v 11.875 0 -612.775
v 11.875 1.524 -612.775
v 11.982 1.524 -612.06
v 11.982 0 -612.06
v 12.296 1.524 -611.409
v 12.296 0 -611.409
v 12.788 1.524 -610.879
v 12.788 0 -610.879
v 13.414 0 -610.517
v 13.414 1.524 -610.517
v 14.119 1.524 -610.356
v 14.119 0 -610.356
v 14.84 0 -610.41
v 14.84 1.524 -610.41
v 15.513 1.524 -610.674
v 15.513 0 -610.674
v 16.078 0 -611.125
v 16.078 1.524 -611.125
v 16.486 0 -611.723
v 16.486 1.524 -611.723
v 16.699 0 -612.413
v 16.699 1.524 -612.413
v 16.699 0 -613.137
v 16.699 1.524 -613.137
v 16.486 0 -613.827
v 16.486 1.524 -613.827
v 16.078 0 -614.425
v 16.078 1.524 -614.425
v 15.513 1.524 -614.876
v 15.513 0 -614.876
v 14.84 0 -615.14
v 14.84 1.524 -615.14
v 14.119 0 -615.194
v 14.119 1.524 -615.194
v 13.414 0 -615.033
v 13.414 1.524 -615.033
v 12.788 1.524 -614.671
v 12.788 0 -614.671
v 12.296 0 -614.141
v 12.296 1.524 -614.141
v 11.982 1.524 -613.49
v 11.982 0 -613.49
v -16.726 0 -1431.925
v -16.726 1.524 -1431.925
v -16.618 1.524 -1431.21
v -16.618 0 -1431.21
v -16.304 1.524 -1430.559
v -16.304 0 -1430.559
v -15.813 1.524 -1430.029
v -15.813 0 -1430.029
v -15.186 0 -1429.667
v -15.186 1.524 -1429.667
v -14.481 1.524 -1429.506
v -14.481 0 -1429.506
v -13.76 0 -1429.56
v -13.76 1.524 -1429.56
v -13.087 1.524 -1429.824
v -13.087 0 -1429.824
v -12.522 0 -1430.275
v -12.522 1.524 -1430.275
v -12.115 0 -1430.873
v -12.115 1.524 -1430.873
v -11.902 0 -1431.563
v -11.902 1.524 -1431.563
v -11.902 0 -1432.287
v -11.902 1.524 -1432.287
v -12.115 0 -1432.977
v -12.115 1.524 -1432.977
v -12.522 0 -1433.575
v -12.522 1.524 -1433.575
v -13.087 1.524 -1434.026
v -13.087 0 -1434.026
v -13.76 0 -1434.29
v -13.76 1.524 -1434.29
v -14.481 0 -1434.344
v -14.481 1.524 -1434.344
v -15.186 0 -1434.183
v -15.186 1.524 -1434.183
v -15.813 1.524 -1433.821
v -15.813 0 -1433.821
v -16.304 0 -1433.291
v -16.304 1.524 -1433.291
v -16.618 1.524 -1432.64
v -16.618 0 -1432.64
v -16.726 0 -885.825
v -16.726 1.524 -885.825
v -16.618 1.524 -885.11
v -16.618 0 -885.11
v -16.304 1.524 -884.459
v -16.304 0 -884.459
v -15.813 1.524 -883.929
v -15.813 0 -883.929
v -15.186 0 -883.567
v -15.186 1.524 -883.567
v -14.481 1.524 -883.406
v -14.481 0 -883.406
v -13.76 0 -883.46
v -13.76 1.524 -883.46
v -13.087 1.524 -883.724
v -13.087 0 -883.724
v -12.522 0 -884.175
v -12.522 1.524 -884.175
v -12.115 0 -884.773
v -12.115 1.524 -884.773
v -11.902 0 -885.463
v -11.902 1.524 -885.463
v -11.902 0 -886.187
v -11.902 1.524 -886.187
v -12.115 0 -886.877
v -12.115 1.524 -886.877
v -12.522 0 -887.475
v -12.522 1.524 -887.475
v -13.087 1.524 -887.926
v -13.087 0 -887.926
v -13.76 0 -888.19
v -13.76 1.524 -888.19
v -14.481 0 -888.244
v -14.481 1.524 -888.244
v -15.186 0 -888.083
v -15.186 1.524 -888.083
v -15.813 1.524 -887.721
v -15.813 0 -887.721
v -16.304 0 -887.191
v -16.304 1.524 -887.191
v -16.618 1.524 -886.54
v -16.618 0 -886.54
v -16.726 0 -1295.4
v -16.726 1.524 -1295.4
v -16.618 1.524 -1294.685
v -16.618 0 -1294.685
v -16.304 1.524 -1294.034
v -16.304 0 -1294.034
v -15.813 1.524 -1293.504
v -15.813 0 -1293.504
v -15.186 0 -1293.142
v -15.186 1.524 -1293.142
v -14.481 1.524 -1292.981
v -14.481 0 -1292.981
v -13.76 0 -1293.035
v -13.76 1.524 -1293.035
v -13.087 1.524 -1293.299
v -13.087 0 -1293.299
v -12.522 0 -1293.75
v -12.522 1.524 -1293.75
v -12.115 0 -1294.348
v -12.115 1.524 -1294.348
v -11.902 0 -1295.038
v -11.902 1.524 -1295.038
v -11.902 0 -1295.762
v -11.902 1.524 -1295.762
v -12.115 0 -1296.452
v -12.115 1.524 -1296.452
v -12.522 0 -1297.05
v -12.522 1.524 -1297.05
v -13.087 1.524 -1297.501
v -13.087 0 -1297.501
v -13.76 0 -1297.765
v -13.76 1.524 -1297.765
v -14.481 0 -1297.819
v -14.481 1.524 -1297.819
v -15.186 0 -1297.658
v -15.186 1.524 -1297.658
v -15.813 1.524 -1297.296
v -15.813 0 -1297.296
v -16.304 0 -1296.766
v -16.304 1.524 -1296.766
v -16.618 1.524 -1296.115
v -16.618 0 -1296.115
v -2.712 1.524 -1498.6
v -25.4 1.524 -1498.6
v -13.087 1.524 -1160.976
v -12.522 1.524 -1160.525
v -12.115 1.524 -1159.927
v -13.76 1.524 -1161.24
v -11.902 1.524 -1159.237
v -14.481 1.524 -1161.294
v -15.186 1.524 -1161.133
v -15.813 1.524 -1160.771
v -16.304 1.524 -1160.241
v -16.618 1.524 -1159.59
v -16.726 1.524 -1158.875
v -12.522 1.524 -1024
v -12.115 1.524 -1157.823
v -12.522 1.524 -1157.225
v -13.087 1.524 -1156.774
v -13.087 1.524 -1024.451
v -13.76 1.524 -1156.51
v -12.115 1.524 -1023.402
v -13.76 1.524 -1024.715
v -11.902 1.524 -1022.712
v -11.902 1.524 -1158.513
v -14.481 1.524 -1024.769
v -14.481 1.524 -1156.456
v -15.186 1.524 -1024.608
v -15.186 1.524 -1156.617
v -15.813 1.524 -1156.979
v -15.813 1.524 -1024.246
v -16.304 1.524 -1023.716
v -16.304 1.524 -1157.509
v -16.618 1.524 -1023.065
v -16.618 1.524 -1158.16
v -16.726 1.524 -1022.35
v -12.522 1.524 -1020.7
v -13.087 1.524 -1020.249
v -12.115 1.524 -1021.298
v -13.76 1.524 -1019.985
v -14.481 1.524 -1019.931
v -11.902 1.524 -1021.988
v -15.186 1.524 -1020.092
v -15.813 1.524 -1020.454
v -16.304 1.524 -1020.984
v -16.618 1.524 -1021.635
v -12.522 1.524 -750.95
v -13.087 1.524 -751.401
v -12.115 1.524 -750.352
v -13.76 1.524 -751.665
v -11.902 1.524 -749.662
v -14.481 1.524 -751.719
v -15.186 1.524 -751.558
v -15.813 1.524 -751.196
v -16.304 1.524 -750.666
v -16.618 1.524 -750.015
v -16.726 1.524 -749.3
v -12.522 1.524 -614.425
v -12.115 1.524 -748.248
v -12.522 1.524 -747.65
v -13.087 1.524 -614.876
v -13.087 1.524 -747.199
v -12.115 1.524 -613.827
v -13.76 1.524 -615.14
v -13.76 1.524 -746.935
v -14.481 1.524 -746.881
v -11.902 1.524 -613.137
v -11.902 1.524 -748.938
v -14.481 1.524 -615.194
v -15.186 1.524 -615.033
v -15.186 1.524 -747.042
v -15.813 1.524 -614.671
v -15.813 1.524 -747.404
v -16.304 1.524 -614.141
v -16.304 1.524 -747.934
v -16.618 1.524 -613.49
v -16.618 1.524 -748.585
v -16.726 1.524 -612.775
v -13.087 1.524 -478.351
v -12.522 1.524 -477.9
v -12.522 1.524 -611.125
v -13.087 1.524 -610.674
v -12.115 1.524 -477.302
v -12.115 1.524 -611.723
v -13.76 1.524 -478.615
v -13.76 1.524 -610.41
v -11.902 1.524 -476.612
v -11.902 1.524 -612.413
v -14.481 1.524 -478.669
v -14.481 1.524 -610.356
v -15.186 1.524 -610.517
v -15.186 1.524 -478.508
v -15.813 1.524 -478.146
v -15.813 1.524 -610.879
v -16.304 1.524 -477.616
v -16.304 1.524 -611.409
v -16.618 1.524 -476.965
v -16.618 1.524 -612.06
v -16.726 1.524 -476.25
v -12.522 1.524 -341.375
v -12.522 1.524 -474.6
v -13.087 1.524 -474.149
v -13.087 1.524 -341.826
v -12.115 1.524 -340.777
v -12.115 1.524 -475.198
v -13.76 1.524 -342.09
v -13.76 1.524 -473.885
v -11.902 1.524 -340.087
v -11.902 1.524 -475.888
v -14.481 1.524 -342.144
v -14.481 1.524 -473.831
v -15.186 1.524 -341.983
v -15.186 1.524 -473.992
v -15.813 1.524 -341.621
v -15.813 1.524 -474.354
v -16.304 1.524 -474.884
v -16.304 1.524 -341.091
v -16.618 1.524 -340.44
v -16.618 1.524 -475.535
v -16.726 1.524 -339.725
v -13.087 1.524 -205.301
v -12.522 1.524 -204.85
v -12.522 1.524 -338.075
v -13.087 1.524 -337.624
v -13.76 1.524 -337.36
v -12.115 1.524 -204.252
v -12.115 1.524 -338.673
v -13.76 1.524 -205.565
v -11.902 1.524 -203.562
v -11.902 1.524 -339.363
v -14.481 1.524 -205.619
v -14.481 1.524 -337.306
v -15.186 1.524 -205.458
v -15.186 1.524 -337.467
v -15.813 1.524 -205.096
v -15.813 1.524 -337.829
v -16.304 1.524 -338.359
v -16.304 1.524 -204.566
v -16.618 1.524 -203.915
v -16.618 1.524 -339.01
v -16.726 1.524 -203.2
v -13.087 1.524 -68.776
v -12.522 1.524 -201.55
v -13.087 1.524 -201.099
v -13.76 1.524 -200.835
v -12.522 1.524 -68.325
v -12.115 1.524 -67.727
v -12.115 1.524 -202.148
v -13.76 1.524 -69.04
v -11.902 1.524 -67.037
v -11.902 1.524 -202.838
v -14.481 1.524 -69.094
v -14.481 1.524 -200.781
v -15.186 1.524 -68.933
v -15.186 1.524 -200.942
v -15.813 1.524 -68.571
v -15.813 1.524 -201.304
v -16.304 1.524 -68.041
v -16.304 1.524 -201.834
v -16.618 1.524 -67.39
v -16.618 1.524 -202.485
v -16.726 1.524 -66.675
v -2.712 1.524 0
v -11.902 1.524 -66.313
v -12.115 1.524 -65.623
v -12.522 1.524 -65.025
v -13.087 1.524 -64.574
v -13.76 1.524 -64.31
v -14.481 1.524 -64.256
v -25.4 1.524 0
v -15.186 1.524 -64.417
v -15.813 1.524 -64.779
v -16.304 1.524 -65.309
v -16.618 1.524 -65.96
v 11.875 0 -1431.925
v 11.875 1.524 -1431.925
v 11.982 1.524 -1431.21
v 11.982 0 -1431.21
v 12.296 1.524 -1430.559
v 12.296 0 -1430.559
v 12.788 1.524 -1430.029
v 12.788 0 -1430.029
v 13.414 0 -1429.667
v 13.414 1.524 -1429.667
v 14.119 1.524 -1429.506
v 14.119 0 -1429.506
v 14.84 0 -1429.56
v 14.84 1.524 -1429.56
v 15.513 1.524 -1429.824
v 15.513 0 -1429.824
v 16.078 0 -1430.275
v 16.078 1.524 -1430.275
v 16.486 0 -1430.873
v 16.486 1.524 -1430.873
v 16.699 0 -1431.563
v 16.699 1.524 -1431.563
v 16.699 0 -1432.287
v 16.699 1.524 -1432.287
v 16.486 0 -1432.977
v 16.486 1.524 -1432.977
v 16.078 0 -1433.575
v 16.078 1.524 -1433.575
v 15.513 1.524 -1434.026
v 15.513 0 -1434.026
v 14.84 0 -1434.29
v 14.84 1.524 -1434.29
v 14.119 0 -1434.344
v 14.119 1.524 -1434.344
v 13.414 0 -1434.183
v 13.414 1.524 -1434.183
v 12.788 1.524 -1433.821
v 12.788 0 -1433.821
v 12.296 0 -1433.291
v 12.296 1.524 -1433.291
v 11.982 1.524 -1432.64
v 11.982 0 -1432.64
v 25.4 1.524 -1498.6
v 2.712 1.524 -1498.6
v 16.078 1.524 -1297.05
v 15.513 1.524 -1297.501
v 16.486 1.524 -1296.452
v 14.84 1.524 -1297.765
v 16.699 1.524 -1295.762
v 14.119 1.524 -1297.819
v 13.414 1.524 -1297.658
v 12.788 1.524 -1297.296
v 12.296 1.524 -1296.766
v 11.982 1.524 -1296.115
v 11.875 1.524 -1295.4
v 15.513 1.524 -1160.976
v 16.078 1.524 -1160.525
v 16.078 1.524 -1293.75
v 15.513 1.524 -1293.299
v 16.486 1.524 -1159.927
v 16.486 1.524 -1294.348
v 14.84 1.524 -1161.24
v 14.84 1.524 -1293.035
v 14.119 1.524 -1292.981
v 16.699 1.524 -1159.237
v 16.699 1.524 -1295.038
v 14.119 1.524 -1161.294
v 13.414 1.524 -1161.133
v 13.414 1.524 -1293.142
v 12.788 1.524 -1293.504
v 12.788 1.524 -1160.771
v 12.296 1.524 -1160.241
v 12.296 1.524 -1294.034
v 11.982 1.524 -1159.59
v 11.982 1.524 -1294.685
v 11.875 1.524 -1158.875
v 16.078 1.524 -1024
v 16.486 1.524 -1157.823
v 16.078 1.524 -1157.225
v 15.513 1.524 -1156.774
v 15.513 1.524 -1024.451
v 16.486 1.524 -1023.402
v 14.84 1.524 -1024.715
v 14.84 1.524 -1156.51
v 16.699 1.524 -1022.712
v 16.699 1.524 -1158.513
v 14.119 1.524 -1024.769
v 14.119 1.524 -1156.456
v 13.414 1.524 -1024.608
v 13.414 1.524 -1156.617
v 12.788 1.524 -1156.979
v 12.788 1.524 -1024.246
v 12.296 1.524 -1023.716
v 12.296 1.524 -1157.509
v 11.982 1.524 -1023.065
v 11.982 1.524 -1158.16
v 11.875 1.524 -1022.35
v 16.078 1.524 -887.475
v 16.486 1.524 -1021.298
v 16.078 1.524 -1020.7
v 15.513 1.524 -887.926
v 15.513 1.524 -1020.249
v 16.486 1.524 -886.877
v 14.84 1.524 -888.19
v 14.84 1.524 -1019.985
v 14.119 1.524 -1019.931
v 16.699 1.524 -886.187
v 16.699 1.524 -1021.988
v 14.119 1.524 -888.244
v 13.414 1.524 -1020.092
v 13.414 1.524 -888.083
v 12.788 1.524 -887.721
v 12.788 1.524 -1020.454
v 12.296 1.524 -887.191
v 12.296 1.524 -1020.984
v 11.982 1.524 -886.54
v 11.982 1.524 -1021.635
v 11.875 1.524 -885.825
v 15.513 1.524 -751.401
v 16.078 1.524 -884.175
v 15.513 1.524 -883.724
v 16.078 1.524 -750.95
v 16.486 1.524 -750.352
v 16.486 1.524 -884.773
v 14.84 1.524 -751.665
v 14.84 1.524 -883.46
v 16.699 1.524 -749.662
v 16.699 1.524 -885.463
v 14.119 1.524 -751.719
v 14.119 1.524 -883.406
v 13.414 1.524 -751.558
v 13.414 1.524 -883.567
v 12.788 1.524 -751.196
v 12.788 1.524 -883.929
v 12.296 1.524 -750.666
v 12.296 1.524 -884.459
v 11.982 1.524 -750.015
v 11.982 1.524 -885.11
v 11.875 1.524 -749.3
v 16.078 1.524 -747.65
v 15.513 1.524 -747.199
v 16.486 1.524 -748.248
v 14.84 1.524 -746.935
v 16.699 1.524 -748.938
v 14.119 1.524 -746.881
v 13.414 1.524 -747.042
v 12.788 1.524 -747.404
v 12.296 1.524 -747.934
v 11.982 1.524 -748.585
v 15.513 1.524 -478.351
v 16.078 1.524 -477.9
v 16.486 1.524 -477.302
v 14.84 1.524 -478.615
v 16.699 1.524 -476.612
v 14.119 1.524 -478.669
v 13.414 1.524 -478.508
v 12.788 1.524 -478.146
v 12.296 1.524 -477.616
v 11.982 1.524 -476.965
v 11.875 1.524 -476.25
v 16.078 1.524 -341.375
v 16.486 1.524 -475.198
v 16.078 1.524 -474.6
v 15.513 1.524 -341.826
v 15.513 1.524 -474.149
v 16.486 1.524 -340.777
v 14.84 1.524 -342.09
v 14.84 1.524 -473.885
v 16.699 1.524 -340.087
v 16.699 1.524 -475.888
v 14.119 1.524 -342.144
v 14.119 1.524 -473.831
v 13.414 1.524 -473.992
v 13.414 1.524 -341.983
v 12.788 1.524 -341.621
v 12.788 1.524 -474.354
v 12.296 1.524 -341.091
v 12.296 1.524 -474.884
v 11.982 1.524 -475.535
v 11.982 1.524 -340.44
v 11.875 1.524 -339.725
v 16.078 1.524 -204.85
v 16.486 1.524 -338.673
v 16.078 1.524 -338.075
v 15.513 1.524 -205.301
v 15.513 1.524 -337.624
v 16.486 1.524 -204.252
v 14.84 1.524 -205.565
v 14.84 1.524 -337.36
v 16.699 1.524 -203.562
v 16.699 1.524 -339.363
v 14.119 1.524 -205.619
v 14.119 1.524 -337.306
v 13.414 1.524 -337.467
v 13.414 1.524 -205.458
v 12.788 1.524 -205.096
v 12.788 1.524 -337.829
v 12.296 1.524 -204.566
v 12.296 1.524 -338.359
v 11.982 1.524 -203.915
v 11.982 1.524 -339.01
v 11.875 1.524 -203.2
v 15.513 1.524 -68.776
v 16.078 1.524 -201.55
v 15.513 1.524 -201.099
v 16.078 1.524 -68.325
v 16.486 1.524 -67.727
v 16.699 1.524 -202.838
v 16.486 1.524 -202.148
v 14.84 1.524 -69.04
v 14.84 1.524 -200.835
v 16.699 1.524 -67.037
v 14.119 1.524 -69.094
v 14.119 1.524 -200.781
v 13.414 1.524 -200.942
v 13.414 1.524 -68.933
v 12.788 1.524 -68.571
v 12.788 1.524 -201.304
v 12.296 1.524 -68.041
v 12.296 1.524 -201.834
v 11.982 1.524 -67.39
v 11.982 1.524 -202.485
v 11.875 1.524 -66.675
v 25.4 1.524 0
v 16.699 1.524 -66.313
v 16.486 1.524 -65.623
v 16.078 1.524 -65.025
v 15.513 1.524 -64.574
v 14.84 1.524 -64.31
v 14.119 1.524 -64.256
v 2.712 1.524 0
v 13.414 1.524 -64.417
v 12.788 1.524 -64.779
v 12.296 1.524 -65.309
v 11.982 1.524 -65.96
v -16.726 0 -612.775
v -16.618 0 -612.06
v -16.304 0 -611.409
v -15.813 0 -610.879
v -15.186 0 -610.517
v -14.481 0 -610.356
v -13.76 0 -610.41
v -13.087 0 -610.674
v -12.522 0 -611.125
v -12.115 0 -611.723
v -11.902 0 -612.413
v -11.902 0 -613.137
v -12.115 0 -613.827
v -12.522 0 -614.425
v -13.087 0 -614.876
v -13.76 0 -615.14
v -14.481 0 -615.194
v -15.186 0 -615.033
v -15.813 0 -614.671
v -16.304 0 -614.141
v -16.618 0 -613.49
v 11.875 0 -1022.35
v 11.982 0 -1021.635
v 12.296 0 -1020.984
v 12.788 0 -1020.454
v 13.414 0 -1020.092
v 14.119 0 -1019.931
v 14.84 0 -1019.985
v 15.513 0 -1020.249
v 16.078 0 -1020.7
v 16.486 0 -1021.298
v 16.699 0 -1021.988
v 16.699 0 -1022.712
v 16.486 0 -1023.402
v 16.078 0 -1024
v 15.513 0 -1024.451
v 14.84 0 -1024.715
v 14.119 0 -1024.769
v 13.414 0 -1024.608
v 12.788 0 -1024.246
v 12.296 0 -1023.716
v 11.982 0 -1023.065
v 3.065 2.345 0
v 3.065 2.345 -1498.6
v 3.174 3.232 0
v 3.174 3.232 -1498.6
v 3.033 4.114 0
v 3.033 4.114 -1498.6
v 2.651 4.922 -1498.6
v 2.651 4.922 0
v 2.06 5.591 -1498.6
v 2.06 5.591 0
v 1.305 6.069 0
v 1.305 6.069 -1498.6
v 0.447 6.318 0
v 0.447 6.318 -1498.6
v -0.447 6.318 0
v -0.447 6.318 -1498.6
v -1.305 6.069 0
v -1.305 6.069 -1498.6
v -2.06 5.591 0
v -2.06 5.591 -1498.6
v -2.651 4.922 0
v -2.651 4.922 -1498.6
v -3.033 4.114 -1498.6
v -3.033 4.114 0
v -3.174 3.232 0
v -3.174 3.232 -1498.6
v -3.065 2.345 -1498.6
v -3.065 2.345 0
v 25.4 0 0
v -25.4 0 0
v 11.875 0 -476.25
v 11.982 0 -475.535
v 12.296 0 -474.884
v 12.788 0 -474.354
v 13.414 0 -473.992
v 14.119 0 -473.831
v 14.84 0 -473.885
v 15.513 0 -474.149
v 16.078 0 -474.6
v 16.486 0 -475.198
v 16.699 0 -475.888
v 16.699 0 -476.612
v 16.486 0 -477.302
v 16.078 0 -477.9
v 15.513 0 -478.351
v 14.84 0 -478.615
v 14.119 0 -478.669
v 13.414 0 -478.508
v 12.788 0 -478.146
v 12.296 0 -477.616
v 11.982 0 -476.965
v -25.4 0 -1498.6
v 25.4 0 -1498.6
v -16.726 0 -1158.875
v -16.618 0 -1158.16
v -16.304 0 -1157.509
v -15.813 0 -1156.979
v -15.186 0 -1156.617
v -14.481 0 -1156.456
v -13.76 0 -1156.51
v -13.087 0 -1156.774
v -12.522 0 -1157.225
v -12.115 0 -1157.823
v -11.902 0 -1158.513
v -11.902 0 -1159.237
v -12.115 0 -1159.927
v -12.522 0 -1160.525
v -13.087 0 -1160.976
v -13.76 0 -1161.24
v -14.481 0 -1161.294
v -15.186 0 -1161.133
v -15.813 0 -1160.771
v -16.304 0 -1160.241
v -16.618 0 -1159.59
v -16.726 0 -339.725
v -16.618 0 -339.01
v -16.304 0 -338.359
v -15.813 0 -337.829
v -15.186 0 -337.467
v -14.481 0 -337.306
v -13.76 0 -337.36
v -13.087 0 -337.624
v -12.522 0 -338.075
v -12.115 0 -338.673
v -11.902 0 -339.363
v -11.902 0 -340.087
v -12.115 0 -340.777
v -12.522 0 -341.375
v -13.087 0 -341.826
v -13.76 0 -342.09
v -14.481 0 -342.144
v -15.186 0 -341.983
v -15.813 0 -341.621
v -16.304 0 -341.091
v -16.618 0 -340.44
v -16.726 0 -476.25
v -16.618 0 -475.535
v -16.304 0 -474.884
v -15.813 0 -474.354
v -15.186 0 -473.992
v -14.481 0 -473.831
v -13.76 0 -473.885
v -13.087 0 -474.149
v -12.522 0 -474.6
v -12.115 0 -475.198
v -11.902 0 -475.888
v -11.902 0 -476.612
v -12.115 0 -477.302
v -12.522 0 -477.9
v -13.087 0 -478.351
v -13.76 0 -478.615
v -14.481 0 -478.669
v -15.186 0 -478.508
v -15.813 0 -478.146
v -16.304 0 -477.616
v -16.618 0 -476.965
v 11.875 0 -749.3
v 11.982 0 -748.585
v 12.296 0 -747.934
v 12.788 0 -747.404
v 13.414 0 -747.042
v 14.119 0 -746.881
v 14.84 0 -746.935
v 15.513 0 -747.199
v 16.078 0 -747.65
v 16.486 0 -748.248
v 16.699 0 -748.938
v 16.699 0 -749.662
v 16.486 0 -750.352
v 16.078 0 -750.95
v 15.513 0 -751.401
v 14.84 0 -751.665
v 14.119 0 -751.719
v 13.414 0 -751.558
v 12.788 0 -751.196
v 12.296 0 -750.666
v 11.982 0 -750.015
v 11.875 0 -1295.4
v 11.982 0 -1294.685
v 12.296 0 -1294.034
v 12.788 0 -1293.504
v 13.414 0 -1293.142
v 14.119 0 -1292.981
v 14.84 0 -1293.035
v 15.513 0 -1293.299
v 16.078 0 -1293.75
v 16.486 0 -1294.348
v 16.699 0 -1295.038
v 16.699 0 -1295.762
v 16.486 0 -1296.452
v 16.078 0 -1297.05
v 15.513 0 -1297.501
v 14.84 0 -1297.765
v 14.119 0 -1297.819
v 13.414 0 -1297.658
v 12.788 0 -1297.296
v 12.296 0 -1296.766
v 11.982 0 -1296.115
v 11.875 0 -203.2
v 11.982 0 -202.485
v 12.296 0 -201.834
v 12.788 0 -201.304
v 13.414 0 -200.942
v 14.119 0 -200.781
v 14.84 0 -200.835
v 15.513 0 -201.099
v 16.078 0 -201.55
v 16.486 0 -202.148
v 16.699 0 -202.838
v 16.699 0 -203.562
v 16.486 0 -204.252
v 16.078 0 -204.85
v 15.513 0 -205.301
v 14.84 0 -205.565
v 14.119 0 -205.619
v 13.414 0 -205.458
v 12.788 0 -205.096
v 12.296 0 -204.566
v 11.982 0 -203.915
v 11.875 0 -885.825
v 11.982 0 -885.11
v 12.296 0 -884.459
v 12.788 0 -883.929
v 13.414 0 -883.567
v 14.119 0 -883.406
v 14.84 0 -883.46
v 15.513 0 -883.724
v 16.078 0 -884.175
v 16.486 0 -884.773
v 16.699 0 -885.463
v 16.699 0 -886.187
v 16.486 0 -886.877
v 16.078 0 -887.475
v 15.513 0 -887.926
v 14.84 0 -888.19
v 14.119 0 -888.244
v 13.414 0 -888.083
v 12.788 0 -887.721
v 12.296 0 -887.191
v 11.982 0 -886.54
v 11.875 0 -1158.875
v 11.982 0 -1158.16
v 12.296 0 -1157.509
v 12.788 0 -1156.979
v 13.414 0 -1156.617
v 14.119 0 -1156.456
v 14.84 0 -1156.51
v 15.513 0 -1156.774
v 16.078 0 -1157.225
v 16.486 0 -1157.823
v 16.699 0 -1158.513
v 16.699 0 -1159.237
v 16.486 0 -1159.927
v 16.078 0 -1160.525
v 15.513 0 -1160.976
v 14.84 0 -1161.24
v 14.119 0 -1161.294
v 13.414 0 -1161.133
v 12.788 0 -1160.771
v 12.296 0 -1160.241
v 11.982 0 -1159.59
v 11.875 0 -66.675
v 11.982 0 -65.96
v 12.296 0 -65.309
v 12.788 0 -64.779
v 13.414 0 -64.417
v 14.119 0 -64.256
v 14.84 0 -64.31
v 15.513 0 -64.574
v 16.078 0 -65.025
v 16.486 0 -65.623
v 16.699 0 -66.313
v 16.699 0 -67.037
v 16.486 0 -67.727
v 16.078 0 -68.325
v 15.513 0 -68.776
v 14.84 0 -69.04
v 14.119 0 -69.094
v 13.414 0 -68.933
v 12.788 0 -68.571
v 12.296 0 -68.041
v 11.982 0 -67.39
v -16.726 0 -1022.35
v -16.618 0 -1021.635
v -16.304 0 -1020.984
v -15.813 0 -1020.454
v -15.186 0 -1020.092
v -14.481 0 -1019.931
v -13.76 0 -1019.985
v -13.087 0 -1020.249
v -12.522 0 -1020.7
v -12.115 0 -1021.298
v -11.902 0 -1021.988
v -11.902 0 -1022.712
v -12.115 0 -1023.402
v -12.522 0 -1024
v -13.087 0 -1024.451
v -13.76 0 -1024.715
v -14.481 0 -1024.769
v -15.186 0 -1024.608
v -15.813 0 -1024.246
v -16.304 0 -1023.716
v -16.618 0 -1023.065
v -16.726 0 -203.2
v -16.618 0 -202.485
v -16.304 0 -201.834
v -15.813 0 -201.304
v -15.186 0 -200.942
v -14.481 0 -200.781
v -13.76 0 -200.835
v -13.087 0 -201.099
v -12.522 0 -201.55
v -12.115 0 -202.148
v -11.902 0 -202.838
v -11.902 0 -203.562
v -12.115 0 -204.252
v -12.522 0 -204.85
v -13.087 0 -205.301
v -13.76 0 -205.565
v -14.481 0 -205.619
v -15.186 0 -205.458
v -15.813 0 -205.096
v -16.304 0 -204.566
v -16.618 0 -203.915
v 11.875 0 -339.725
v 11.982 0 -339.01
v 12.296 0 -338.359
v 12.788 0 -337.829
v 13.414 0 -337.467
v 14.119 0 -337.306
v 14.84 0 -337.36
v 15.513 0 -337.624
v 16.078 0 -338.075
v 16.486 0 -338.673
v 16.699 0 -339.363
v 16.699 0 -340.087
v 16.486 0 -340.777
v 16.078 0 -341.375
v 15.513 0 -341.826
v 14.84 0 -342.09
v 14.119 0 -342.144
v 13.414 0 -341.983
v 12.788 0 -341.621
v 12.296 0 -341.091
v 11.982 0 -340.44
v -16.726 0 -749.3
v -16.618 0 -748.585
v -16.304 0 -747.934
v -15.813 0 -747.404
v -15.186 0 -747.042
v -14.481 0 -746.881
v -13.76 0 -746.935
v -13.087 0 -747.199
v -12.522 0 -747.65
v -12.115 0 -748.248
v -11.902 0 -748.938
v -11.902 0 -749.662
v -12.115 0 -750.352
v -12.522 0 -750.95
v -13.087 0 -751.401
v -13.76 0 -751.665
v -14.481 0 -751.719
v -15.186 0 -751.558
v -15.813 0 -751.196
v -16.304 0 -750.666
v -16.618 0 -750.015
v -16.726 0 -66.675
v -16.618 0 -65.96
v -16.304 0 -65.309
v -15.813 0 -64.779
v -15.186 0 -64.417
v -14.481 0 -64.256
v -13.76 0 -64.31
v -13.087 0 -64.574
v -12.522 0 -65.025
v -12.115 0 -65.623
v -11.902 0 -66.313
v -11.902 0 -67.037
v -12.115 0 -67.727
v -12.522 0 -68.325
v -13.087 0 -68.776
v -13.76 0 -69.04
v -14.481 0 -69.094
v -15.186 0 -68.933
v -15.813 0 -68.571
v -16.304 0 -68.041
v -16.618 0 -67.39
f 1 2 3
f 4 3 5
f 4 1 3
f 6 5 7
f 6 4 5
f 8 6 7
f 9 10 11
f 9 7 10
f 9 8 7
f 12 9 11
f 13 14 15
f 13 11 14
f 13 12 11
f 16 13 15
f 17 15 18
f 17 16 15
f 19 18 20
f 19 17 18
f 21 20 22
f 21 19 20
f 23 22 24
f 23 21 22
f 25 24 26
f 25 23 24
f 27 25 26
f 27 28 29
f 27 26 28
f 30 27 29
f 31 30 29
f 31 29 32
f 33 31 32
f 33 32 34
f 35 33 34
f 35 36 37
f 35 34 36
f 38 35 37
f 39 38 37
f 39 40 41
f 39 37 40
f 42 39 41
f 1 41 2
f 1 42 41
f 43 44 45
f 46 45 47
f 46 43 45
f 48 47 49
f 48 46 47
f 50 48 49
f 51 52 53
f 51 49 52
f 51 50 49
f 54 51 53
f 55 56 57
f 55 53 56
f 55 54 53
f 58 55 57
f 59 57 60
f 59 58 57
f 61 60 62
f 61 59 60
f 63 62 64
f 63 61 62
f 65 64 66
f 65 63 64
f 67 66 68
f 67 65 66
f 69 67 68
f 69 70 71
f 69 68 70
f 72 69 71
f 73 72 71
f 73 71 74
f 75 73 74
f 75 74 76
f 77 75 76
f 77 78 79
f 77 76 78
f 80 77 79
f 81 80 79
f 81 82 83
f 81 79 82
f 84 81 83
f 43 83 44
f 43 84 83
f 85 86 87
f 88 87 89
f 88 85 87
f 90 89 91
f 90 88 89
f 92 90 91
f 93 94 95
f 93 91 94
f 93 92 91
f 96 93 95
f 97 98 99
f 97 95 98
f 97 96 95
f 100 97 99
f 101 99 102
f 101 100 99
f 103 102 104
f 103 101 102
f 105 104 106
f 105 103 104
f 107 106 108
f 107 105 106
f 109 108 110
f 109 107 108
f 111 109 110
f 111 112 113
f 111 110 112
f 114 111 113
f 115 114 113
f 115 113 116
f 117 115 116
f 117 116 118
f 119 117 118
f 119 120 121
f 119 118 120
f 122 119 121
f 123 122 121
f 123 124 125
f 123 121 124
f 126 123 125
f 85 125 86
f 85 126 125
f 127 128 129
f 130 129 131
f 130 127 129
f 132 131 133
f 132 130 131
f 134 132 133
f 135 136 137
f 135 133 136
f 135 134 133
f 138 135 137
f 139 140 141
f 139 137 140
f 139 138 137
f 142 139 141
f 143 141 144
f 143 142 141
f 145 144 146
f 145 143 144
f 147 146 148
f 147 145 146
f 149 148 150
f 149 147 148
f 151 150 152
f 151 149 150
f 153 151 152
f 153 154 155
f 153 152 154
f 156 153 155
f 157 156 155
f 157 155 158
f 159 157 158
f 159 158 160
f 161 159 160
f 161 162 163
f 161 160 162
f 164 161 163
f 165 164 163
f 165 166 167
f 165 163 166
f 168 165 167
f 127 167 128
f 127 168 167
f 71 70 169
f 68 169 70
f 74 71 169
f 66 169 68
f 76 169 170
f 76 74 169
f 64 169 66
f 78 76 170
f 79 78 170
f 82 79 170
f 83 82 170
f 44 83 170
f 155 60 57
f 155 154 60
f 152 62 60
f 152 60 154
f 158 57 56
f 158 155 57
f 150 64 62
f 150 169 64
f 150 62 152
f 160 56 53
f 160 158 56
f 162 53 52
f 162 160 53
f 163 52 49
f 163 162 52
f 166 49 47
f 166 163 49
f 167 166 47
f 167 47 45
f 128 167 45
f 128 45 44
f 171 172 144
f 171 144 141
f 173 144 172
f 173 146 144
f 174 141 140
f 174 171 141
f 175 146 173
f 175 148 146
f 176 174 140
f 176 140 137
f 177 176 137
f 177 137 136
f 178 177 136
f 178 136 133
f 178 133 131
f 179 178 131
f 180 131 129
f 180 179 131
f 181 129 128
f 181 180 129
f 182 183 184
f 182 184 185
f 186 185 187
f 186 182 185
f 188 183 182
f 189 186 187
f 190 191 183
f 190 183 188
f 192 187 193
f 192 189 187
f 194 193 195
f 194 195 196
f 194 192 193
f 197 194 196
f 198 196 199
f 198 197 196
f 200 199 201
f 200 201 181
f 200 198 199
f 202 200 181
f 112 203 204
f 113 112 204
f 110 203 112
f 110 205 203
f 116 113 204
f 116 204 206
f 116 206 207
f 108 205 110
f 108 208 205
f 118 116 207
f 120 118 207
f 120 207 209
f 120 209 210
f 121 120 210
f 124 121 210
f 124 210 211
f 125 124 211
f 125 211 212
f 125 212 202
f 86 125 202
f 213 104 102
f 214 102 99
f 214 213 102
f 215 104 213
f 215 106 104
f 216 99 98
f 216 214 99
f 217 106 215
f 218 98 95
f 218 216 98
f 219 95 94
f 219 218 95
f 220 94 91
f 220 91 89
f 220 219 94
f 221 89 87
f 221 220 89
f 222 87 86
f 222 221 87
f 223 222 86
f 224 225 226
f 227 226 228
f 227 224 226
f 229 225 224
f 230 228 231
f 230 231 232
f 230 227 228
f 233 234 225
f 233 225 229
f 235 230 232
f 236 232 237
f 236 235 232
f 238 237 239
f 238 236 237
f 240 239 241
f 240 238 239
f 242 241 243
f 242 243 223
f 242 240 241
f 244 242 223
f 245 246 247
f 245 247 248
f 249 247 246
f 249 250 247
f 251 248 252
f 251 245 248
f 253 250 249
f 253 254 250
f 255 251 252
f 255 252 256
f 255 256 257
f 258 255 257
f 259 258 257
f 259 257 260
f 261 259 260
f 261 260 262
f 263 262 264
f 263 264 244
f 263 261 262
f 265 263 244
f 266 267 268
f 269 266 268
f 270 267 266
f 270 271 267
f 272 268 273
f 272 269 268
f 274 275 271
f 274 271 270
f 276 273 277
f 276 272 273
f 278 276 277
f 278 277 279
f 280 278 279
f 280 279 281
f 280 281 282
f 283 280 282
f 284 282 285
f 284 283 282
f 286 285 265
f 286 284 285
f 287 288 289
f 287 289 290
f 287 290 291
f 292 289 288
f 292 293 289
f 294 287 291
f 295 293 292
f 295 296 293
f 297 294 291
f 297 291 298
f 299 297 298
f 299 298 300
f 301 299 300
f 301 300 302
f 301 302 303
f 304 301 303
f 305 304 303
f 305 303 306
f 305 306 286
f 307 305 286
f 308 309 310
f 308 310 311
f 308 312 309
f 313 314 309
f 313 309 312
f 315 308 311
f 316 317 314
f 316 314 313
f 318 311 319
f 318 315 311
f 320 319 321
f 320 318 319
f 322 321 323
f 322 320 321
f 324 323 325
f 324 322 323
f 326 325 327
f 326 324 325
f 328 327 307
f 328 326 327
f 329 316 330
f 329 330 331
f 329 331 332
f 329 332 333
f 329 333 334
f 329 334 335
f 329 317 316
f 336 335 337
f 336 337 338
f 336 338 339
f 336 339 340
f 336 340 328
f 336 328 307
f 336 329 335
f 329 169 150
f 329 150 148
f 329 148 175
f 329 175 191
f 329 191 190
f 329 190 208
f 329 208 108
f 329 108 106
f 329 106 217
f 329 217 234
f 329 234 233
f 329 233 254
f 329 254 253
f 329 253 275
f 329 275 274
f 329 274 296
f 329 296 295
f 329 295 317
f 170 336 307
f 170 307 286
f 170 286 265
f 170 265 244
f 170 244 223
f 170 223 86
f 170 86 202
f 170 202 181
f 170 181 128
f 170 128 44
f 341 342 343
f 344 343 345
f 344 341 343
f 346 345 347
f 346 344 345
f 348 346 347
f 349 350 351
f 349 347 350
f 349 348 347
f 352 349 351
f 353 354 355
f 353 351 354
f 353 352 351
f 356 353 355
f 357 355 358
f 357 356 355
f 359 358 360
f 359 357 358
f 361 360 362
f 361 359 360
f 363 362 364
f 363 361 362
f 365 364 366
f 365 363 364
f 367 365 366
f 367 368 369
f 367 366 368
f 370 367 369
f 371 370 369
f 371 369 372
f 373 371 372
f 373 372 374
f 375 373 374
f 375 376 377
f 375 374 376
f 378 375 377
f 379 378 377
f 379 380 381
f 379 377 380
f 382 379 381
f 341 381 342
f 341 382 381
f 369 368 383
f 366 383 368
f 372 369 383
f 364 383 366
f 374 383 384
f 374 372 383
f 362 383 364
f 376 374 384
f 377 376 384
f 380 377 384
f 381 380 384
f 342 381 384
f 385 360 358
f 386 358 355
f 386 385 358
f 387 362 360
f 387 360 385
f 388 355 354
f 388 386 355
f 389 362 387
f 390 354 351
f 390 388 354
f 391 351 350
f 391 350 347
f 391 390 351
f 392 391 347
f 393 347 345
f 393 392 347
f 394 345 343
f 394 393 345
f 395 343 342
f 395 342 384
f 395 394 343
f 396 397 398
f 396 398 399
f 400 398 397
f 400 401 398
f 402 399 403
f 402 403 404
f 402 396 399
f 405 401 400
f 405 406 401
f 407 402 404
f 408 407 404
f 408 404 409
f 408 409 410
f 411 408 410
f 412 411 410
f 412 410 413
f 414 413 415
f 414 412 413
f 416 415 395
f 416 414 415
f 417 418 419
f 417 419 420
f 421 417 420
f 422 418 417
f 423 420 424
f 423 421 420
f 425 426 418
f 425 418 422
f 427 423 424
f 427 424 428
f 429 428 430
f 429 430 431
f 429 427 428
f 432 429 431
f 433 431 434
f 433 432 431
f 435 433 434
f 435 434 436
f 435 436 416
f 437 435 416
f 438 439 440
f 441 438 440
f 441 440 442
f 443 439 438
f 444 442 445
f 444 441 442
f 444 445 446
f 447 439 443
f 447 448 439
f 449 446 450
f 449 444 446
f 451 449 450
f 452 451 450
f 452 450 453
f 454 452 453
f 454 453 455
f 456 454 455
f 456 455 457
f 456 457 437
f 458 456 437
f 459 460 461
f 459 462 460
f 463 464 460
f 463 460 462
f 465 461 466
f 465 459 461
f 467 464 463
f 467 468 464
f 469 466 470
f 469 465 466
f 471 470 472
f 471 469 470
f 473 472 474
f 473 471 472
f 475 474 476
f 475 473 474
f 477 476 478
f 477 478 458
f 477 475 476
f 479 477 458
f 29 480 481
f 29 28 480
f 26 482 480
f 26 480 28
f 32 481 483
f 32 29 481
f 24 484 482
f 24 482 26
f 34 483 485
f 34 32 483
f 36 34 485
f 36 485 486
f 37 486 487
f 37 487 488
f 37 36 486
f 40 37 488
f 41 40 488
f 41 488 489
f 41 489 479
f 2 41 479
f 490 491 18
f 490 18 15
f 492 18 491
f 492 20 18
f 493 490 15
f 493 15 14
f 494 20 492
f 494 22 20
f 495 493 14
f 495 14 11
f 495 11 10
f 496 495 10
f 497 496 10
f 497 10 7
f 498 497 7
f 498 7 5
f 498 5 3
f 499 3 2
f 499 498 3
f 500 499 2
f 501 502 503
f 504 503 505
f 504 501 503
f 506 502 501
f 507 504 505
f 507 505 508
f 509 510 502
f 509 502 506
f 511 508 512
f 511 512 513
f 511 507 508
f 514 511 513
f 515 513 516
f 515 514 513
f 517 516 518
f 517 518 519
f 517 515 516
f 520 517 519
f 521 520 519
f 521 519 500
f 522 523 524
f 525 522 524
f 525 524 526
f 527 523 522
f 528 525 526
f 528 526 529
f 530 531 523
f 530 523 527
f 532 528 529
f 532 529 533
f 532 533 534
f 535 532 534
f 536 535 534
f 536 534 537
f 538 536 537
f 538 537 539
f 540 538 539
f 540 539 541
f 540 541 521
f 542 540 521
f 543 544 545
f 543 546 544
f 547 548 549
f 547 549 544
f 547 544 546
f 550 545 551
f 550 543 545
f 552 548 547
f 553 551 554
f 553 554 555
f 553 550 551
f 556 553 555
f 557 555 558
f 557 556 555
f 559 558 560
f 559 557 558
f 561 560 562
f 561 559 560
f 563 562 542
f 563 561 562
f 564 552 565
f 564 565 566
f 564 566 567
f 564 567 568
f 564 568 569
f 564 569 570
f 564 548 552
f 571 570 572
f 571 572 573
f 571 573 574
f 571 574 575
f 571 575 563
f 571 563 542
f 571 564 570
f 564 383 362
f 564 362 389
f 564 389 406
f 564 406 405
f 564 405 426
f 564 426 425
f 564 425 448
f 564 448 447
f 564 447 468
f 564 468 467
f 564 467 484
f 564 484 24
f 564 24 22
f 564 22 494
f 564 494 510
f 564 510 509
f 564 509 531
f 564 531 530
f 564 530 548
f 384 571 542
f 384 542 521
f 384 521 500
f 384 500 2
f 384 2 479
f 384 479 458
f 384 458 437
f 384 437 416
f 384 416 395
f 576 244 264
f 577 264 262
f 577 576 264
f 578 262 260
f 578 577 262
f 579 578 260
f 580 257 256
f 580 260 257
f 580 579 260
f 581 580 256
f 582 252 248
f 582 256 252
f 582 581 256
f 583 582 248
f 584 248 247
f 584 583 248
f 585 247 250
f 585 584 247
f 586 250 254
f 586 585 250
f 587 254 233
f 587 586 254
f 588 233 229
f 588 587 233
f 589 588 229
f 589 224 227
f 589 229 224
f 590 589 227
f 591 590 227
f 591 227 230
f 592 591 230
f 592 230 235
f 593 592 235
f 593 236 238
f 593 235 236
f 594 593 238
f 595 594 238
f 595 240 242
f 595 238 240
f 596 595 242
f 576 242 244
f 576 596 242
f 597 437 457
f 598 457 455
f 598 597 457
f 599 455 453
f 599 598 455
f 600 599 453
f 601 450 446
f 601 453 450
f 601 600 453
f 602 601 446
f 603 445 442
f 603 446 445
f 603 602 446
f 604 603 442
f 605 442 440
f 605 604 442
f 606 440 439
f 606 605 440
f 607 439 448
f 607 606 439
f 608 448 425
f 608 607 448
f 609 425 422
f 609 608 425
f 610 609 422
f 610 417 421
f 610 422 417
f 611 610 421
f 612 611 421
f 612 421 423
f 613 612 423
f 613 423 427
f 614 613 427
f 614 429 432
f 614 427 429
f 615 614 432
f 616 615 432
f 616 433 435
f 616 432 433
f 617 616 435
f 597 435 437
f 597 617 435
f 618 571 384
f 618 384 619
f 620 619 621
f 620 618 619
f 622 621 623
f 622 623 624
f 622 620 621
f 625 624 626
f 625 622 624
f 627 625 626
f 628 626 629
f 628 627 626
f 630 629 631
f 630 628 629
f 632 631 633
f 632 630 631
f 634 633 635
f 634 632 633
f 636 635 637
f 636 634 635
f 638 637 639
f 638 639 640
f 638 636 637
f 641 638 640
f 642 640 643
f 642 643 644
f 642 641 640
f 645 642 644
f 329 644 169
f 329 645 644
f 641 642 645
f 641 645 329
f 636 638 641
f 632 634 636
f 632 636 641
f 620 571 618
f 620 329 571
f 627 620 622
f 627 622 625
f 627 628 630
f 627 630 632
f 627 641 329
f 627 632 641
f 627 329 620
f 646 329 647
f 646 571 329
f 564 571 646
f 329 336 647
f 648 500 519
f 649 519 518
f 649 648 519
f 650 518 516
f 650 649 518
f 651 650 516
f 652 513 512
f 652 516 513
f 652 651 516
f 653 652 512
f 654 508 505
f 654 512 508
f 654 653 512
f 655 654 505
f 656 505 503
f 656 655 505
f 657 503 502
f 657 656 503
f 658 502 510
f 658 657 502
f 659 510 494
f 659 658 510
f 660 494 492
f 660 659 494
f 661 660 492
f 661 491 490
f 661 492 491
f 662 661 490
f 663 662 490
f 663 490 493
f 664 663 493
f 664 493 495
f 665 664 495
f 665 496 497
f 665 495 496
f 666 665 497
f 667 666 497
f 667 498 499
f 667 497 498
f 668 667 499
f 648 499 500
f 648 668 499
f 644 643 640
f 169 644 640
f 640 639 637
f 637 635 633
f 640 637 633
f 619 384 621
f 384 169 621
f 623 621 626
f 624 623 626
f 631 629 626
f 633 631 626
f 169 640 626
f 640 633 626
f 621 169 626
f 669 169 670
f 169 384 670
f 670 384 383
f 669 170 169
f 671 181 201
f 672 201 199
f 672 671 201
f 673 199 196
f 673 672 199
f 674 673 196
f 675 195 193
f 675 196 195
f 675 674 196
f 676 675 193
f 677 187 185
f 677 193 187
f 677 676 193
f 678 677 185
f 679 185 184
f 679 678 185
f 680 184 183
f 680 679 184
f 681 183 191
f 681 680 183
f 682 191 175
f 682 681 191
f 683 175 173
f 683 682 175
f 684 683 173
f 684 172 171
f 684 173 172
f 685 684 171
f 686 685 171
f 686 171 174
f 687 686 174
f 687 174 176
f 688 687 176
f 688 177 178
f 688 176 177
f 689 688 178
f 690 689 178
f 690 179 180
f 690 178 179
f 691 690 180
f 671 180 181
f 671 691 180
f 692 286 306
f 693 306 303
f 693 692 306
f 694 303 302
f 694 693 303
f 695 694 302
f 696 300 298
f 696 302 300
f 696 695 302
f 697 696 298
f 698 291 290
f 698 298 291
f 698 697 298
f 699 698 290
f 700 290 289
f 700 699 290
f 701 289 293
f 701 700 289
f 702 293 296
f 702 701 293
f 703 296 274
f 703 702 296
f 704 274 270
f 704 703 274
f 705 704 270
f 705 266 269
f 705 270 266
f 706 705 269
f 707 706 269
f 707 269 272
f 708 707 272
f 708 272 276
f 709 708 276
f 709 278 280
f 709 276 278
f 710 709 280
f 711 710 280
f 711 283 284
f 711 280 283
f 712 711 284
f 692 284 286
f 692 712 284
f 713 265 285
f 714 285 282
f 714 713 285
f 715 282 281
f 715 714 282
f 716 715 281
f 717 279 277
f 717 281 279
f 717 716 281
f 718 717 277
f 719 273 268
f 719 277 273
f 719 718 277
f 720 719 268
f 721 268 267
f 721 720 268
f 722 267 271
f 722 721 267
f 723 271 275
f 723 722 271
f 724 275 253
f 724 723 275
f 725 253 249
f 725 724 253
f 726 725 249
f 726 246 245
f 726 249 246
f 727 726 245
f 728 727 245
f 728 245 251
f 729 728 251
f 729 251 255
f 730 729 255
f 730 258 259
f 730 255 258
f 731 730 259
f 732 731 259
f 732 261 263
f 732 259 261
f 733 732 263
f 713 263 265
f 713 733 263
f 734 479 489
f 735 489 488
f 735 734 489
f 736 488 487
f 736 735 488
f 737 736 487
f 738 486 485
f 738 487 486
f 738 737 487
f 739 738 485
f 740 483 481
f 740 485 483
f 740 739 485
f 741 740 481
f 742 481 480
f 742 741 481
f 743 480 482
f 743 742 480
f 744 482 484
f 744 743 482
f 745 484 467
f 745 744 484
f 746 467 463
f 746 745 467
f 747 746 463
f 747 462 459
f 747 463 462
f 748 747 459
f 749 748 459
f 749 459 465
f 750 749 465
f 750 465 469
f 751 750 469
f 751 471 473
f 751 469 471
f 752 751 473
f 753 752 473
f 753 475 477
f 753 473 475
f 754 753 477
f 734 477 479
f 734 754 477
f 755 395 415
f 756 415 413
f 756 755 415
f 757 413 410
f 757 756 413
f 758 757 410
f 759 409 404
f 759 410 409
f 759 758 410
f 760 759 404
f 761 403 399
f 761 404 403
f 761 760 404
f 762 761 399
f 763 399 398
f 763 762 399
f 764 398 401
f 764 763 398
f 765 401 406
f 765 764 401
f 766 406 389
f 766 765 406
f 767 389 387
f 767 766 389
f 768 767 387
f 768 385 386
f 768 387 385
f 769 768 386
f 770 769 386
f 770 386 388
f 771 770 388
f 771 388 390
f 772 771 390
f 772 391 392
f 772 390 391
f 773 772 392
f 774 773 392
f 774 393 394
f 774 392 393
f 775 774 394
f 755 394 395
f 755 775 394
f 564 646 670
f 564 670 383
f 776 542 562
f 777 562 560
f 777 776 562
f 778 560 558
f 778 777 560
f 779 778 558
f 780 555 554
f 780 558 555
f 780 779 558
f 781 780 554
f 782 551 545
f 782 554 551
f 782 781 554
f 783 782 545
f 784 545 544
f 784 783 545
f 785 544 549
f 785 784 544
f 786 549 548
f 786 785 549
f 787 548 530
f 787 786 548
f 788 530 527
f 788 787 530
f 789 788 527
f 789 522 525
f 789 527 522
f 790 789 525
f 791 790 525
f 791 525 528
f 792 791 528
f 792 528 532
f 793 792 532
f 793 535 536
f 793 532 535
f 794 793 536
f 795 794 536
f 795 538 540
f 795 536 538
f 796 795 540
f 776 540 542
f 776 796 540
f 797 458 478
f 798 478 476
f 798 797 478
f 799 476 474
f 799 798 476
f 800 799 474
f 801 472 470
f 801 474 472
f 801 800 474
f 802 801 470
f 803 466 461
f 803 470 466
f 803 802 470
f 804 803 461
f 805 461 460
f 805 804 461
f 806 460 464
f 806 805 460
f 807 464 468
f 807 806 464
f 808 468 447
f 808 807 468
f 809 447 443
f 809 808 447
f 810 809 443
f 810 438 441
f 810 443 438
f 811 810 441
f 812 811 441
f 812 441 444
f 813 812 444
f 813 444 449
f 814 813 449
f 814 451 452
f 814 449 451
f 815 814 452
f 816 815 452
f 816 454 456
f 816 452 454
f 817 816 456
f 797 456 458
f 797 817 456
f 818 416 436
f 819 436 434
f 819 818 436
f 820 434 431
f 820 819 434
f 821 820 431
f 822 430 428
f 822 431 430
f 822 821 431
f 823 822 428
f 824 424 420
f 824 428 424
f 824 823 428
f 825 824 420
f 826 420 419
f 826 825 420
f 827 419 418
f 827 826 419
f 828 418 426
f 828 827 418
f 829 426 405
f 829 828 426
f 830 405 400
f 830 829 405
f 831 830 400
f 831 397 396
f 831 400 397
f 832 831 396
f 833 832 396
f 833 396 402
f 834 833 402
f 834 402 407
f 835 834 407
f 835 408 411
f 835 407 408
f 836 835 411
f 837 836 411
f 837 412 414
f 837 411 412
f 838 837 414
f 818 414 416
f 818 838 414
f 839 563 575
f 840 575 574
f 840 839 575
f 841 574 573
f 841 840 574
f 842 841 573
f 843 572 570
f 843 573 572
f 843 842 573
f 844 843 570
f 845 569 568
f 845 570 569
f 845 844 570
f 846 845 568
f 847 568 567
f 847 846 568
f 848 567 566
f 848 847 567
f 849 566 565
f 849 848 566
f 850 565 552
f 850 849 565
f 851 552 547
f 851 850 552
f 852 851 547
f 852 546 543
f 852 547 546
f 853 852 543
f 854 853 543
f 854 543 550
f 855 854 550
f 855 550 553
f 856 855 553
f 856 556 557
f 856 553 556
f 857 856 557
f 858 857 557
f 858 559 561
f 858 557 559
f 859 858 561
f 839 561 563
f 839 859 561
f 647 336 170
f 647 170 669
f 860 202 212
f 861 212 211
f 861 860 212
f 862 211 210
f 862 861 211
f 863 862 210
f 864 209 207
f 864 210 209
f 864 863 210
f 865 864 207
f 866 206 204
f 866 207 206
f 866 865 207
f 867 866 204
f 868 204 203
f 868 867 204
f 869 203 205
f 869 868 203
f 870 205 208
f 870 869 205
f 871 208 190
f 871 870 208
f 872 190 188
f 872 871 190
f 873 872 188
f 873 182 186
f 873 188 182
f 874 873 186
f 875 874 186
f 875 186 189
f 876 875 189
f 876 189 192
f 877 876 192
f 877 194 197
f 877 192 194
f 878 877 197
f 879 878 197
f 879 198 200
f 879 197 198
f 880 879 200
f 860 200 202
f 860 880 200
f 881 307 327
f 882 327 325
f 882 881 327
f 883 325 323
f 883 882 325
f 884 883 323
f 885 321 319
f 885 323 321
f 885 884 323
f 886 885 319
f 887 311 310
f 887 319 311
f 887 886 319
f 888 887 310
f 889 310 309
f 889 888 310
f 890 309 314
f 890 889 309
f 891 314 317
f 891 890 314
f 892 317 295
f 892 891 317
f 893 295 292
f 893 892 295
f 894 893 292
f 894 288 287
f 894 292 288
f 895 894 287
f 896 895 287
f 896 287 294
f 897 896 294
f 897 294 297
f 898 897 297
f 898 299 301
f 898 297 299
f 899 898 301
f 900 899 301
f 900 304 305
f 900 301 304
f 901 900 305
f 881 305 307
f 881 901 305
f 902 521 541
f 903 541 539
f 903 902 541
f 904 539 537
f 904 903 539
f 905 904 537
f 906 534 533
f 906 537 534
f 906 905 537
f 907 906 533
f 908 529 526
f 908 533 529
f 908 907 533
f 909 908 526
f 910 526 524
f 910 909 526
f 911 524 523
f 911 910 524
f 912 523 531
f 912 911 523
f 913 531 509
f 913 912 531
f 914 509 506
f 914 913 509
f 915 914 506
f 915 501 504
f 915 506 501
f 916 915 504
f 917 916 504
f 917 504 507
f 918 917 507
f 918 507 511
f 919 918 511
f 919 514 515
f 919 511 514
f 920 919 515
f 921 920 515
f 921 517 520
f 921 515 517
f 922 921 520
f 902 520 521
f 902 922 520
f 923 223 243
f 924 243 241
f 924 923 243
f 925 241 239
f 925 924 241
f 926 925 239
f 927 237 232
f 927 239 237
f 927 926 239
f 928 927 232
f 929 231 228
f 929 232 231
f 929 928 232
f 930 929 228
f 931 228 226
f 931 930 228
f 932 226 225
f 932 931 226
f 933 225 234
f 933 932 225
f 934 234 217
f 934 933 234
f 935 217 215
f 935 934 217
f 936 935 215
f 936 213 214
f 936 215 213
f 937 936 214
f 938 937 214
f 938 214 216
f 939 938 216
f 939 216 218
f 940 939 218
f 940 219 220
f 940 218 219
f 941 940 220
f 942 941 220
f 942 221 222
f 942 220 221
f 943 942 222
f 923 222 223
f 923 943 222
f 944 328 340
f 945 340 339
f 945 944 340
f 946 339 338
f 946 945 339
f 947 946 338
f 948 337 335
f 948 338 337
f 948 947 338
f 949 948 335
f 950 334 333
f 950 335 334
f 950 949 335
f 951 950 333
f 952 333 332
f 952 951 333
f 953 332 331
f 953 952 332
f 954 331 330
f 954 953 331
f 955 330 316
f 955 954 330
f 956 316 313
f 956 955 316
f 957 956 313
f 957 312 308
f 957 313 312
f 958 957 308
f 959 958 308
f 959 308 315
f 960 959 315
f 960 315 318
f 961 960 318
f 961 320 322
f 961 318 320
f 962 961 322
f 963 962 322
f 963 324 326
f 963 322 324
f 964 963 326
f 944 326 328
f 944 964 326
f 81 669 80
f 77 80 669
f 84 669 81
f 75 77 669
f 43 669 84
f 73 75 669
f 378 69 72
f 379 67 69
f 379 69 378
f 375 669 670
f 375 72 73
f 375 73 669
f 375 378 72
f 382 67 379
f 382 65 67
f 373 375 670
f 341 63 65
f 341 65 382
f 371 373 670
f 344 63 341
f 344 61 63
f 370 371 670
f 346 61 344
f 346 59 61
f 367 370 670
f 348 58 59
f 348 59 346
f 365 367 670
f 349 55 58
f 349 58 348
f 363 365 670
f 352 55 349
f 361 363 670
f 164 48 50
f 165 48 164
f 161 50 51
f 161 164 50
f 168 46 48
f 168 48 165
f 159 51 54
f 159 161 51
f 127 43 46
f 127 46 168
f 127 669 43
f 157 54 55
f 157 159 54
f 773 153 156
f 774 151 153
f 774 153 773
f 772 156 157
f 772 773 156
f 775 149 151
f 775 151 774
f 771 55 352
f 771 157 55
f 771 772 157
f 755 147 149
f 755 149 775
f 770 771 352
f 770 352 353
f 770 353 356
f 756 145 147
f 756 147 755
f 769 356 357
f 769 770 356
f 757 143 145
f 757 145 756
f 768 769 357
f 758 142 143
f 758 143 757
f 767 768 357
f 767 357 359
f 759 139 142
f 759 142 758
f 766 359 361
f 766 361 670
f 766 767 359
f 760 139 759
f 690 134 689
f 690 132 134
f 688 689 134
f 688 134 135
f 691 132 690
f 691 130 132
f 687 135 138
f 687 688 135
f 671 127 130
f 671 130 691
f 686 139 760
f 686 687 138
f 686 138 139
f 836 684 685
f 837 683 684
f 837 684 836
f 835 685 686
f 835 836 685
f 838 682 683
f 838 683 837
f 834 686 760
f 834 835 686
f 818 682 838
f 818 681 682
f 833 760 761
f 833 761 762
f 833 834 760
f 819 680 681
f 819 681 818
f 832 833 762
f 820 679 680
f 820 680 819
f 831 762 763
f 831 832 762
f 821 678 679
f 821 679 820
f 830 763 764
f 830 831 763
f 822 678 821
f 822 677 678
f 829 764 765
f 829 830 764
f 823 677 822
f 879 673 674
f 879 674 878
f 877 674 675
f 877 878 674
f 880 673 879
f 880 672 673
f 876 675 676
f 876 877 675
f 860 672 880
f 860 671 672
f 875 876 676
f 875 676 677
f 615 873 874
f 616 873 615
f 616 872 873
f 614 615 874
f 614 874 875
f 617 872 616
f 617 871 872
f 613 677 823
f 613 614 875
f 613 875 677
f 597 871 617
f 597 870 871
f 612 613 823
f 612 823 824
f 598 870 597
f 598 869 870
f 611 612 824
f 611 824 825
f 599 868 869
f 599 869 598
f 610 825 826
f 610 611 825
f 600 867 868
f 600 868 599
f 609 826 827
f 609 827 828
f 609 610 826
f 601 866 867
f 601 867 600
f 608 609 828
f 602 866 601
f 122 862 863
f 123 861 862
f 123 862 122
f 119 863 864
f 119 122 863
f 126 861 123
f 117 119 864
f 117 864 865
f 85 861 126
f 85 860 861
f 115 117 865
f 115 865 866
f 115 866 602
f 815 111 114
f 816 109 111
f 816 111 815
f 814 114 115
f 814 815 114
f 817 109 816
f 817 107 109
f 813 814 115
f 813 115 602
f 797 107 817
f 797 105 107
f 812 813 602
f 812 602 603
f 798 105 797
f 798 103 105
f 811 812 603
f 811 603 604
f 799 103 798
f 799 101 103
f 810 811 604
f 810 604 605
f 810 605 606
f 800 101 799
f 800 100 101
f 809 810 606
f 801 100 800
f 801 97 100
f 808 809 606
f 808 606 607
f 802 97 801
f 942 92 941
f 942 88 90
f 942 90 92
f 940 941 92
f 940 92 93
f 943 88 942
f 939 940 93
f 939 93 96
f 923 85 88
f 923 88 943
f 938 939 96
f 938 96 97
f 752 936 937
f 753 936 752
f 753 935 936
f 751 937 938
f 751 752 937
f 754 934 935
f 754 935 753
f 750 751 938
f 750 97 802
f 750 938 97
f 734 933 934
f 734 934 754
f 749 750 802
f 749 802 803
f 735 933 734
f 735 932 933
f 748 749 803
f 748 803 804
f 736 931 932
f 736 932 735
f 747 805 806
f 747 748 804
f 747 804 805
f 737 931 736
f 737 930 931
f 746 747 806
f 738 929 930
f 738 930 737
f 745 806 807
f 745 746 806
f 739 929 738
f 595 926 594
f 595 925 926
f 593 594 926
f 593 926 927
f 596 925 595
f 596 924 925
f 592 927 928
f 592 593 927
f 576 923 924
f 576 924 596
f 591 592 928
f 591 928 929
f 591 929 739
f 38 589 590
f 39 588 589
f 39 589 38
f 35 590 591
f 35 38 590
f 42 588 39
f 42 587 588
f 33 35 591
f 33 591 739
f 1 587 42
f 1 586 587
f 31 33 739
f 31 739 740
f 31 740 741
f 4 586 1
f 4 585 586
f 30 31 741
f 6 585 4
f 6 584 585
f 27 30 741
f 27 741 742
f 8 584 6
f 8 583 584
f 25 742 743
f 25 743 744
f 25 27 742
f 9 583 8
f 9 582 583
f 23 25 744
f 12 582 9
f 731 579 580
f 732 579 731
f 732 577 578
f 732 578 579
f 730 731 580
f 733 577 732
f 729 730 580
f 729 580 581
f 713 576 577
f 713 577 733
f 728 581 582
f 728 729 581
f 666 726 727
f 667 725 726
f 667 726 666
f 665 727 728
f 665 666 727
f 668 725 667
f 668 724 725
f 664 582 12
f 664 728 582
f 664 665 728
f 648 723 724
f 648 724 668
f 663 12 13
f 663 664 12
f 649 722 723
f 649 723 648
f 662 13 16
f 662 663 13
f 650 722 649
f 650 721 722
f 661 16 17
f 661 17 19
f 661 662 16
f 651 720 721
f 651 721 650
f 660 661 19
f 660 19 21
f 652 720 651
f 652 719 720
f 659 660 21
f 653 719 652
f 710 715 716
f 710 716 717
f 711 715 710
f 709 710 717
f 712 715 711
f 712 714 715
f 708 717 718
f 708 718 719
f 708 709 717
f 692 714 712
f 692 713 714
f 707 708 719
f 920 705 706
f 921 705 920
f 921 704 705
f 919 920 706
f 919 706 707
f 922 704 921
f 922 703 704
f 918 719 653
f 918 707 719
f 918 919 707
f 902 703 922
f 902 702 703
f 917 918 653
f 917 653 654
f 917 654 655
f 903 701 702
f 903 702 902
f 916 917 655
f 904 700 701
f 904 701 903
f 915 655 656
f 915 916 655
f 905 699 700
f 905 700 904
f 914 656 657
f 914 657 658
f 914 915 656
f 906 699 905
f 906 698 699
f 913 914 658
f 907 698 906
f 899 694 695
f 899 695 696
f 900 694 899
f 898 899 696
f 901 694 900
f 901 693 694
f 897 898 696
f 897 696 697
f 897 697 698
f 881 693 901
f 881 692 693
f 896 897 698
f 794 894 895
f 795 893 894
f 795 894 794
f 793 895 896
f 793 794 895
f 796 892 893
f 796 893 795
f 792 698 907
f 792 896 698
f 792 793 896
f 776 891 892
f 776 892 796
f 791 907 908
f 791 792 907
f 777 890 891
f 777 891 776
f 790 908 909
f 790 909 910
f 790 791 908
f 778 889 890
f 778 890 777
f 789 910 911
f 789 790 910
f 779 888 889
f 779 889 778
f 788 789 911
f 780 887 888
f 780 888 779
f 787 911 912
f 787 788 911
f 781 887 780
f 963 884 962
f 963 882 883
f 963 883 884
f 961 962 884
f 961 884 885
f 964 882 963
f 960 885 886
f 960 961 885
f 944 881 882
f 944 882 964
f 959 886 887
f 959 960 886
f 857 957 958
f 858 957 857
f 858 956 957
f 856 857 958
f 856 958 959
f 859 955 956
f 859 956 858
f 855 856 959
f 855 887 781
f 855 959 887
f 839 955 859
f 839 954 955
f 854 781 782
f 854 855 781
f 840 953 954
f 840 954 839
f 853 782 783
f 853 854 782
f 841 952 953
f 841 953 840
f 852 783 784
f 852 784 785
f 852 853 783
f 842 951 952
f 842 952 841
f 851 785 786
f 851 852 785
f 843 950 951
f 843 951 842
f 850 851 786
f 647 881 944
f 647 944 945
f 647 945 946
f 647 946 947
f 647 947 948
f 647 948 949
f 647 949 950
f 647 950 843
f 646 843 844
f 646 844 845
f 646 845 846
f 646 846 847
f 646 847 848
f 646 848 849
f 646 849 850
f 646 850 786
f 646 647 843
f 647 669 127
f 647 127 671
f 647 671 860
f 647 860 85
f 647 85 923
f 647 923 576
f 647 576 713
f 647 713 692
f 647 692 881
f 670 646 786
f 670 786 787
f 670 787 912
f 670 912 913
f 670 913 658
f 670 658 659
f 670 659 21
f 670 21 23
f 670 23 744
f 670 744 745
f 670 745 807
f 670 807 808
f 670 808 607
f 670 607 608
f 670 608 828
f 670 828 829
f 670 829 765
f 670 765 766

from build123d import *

# Parameters (mm, degrees)
EXTRUDE1_DEPTH     = 1498.6
SKETCH2_R          = 2.4257
CUT_EXTRUDE1_DEPTH = 1499.828690178
LPATTERN1_COUNT    = 11
LPATTERN1_PITCH    = 136.525


with BuildPart() as part:
    # Sketch1 → Extrude1 (new body)
    with BuildSketch(Plane.XY):
        with BuildLine():
            Line((-25.4, 0), (25.4, 0))
            Line((25.4, 0), (25.4, 1.524))
            Line((25.4, 1.524), (2.711977876, 1.524))
            ThreePointArc((2.711977876, 1.524), (0, 6.35), (-2.711977876, 1.524))
            Line((-2.711977876, 1.524), (-25.4, 1.524))
            Line((-25.4, 1.524), (-25.4, 0))
        make_face()
    extrude(amount=-EXTRUDE1_DEPTH)

    # Sketch2 → Cut-Extrude1 (cut, through all)
    with BuildSketch(Plane(origin=(0, 0, 0), x_dir=(1, 0, 0), z_dir=(0, 1, 0))):
        with Locations(Location((14.3002, 66.675, 0), (0, 0, 180))):
            Circle(SKETCH2_R)
        with Locations(Location((-14.3002, 66.675, 0), (0, 0, 180))):
            Circle(SKETCH2_R)
    cut_extrude1 = extrude(amount=CUT_EXTRUDE1_DEPTH, mode=Mode.SUBTRACT)

    # LPattern1: Cut-Extrude1 ×11
    with Locations(*[(0, 0, -i * LPATTERN1_PITCH) for i in range(1, LPATTERN1_COUNT)]):
        add(cut_extrude1, mode=Mode.SUBTRACT)


solid = part.part
